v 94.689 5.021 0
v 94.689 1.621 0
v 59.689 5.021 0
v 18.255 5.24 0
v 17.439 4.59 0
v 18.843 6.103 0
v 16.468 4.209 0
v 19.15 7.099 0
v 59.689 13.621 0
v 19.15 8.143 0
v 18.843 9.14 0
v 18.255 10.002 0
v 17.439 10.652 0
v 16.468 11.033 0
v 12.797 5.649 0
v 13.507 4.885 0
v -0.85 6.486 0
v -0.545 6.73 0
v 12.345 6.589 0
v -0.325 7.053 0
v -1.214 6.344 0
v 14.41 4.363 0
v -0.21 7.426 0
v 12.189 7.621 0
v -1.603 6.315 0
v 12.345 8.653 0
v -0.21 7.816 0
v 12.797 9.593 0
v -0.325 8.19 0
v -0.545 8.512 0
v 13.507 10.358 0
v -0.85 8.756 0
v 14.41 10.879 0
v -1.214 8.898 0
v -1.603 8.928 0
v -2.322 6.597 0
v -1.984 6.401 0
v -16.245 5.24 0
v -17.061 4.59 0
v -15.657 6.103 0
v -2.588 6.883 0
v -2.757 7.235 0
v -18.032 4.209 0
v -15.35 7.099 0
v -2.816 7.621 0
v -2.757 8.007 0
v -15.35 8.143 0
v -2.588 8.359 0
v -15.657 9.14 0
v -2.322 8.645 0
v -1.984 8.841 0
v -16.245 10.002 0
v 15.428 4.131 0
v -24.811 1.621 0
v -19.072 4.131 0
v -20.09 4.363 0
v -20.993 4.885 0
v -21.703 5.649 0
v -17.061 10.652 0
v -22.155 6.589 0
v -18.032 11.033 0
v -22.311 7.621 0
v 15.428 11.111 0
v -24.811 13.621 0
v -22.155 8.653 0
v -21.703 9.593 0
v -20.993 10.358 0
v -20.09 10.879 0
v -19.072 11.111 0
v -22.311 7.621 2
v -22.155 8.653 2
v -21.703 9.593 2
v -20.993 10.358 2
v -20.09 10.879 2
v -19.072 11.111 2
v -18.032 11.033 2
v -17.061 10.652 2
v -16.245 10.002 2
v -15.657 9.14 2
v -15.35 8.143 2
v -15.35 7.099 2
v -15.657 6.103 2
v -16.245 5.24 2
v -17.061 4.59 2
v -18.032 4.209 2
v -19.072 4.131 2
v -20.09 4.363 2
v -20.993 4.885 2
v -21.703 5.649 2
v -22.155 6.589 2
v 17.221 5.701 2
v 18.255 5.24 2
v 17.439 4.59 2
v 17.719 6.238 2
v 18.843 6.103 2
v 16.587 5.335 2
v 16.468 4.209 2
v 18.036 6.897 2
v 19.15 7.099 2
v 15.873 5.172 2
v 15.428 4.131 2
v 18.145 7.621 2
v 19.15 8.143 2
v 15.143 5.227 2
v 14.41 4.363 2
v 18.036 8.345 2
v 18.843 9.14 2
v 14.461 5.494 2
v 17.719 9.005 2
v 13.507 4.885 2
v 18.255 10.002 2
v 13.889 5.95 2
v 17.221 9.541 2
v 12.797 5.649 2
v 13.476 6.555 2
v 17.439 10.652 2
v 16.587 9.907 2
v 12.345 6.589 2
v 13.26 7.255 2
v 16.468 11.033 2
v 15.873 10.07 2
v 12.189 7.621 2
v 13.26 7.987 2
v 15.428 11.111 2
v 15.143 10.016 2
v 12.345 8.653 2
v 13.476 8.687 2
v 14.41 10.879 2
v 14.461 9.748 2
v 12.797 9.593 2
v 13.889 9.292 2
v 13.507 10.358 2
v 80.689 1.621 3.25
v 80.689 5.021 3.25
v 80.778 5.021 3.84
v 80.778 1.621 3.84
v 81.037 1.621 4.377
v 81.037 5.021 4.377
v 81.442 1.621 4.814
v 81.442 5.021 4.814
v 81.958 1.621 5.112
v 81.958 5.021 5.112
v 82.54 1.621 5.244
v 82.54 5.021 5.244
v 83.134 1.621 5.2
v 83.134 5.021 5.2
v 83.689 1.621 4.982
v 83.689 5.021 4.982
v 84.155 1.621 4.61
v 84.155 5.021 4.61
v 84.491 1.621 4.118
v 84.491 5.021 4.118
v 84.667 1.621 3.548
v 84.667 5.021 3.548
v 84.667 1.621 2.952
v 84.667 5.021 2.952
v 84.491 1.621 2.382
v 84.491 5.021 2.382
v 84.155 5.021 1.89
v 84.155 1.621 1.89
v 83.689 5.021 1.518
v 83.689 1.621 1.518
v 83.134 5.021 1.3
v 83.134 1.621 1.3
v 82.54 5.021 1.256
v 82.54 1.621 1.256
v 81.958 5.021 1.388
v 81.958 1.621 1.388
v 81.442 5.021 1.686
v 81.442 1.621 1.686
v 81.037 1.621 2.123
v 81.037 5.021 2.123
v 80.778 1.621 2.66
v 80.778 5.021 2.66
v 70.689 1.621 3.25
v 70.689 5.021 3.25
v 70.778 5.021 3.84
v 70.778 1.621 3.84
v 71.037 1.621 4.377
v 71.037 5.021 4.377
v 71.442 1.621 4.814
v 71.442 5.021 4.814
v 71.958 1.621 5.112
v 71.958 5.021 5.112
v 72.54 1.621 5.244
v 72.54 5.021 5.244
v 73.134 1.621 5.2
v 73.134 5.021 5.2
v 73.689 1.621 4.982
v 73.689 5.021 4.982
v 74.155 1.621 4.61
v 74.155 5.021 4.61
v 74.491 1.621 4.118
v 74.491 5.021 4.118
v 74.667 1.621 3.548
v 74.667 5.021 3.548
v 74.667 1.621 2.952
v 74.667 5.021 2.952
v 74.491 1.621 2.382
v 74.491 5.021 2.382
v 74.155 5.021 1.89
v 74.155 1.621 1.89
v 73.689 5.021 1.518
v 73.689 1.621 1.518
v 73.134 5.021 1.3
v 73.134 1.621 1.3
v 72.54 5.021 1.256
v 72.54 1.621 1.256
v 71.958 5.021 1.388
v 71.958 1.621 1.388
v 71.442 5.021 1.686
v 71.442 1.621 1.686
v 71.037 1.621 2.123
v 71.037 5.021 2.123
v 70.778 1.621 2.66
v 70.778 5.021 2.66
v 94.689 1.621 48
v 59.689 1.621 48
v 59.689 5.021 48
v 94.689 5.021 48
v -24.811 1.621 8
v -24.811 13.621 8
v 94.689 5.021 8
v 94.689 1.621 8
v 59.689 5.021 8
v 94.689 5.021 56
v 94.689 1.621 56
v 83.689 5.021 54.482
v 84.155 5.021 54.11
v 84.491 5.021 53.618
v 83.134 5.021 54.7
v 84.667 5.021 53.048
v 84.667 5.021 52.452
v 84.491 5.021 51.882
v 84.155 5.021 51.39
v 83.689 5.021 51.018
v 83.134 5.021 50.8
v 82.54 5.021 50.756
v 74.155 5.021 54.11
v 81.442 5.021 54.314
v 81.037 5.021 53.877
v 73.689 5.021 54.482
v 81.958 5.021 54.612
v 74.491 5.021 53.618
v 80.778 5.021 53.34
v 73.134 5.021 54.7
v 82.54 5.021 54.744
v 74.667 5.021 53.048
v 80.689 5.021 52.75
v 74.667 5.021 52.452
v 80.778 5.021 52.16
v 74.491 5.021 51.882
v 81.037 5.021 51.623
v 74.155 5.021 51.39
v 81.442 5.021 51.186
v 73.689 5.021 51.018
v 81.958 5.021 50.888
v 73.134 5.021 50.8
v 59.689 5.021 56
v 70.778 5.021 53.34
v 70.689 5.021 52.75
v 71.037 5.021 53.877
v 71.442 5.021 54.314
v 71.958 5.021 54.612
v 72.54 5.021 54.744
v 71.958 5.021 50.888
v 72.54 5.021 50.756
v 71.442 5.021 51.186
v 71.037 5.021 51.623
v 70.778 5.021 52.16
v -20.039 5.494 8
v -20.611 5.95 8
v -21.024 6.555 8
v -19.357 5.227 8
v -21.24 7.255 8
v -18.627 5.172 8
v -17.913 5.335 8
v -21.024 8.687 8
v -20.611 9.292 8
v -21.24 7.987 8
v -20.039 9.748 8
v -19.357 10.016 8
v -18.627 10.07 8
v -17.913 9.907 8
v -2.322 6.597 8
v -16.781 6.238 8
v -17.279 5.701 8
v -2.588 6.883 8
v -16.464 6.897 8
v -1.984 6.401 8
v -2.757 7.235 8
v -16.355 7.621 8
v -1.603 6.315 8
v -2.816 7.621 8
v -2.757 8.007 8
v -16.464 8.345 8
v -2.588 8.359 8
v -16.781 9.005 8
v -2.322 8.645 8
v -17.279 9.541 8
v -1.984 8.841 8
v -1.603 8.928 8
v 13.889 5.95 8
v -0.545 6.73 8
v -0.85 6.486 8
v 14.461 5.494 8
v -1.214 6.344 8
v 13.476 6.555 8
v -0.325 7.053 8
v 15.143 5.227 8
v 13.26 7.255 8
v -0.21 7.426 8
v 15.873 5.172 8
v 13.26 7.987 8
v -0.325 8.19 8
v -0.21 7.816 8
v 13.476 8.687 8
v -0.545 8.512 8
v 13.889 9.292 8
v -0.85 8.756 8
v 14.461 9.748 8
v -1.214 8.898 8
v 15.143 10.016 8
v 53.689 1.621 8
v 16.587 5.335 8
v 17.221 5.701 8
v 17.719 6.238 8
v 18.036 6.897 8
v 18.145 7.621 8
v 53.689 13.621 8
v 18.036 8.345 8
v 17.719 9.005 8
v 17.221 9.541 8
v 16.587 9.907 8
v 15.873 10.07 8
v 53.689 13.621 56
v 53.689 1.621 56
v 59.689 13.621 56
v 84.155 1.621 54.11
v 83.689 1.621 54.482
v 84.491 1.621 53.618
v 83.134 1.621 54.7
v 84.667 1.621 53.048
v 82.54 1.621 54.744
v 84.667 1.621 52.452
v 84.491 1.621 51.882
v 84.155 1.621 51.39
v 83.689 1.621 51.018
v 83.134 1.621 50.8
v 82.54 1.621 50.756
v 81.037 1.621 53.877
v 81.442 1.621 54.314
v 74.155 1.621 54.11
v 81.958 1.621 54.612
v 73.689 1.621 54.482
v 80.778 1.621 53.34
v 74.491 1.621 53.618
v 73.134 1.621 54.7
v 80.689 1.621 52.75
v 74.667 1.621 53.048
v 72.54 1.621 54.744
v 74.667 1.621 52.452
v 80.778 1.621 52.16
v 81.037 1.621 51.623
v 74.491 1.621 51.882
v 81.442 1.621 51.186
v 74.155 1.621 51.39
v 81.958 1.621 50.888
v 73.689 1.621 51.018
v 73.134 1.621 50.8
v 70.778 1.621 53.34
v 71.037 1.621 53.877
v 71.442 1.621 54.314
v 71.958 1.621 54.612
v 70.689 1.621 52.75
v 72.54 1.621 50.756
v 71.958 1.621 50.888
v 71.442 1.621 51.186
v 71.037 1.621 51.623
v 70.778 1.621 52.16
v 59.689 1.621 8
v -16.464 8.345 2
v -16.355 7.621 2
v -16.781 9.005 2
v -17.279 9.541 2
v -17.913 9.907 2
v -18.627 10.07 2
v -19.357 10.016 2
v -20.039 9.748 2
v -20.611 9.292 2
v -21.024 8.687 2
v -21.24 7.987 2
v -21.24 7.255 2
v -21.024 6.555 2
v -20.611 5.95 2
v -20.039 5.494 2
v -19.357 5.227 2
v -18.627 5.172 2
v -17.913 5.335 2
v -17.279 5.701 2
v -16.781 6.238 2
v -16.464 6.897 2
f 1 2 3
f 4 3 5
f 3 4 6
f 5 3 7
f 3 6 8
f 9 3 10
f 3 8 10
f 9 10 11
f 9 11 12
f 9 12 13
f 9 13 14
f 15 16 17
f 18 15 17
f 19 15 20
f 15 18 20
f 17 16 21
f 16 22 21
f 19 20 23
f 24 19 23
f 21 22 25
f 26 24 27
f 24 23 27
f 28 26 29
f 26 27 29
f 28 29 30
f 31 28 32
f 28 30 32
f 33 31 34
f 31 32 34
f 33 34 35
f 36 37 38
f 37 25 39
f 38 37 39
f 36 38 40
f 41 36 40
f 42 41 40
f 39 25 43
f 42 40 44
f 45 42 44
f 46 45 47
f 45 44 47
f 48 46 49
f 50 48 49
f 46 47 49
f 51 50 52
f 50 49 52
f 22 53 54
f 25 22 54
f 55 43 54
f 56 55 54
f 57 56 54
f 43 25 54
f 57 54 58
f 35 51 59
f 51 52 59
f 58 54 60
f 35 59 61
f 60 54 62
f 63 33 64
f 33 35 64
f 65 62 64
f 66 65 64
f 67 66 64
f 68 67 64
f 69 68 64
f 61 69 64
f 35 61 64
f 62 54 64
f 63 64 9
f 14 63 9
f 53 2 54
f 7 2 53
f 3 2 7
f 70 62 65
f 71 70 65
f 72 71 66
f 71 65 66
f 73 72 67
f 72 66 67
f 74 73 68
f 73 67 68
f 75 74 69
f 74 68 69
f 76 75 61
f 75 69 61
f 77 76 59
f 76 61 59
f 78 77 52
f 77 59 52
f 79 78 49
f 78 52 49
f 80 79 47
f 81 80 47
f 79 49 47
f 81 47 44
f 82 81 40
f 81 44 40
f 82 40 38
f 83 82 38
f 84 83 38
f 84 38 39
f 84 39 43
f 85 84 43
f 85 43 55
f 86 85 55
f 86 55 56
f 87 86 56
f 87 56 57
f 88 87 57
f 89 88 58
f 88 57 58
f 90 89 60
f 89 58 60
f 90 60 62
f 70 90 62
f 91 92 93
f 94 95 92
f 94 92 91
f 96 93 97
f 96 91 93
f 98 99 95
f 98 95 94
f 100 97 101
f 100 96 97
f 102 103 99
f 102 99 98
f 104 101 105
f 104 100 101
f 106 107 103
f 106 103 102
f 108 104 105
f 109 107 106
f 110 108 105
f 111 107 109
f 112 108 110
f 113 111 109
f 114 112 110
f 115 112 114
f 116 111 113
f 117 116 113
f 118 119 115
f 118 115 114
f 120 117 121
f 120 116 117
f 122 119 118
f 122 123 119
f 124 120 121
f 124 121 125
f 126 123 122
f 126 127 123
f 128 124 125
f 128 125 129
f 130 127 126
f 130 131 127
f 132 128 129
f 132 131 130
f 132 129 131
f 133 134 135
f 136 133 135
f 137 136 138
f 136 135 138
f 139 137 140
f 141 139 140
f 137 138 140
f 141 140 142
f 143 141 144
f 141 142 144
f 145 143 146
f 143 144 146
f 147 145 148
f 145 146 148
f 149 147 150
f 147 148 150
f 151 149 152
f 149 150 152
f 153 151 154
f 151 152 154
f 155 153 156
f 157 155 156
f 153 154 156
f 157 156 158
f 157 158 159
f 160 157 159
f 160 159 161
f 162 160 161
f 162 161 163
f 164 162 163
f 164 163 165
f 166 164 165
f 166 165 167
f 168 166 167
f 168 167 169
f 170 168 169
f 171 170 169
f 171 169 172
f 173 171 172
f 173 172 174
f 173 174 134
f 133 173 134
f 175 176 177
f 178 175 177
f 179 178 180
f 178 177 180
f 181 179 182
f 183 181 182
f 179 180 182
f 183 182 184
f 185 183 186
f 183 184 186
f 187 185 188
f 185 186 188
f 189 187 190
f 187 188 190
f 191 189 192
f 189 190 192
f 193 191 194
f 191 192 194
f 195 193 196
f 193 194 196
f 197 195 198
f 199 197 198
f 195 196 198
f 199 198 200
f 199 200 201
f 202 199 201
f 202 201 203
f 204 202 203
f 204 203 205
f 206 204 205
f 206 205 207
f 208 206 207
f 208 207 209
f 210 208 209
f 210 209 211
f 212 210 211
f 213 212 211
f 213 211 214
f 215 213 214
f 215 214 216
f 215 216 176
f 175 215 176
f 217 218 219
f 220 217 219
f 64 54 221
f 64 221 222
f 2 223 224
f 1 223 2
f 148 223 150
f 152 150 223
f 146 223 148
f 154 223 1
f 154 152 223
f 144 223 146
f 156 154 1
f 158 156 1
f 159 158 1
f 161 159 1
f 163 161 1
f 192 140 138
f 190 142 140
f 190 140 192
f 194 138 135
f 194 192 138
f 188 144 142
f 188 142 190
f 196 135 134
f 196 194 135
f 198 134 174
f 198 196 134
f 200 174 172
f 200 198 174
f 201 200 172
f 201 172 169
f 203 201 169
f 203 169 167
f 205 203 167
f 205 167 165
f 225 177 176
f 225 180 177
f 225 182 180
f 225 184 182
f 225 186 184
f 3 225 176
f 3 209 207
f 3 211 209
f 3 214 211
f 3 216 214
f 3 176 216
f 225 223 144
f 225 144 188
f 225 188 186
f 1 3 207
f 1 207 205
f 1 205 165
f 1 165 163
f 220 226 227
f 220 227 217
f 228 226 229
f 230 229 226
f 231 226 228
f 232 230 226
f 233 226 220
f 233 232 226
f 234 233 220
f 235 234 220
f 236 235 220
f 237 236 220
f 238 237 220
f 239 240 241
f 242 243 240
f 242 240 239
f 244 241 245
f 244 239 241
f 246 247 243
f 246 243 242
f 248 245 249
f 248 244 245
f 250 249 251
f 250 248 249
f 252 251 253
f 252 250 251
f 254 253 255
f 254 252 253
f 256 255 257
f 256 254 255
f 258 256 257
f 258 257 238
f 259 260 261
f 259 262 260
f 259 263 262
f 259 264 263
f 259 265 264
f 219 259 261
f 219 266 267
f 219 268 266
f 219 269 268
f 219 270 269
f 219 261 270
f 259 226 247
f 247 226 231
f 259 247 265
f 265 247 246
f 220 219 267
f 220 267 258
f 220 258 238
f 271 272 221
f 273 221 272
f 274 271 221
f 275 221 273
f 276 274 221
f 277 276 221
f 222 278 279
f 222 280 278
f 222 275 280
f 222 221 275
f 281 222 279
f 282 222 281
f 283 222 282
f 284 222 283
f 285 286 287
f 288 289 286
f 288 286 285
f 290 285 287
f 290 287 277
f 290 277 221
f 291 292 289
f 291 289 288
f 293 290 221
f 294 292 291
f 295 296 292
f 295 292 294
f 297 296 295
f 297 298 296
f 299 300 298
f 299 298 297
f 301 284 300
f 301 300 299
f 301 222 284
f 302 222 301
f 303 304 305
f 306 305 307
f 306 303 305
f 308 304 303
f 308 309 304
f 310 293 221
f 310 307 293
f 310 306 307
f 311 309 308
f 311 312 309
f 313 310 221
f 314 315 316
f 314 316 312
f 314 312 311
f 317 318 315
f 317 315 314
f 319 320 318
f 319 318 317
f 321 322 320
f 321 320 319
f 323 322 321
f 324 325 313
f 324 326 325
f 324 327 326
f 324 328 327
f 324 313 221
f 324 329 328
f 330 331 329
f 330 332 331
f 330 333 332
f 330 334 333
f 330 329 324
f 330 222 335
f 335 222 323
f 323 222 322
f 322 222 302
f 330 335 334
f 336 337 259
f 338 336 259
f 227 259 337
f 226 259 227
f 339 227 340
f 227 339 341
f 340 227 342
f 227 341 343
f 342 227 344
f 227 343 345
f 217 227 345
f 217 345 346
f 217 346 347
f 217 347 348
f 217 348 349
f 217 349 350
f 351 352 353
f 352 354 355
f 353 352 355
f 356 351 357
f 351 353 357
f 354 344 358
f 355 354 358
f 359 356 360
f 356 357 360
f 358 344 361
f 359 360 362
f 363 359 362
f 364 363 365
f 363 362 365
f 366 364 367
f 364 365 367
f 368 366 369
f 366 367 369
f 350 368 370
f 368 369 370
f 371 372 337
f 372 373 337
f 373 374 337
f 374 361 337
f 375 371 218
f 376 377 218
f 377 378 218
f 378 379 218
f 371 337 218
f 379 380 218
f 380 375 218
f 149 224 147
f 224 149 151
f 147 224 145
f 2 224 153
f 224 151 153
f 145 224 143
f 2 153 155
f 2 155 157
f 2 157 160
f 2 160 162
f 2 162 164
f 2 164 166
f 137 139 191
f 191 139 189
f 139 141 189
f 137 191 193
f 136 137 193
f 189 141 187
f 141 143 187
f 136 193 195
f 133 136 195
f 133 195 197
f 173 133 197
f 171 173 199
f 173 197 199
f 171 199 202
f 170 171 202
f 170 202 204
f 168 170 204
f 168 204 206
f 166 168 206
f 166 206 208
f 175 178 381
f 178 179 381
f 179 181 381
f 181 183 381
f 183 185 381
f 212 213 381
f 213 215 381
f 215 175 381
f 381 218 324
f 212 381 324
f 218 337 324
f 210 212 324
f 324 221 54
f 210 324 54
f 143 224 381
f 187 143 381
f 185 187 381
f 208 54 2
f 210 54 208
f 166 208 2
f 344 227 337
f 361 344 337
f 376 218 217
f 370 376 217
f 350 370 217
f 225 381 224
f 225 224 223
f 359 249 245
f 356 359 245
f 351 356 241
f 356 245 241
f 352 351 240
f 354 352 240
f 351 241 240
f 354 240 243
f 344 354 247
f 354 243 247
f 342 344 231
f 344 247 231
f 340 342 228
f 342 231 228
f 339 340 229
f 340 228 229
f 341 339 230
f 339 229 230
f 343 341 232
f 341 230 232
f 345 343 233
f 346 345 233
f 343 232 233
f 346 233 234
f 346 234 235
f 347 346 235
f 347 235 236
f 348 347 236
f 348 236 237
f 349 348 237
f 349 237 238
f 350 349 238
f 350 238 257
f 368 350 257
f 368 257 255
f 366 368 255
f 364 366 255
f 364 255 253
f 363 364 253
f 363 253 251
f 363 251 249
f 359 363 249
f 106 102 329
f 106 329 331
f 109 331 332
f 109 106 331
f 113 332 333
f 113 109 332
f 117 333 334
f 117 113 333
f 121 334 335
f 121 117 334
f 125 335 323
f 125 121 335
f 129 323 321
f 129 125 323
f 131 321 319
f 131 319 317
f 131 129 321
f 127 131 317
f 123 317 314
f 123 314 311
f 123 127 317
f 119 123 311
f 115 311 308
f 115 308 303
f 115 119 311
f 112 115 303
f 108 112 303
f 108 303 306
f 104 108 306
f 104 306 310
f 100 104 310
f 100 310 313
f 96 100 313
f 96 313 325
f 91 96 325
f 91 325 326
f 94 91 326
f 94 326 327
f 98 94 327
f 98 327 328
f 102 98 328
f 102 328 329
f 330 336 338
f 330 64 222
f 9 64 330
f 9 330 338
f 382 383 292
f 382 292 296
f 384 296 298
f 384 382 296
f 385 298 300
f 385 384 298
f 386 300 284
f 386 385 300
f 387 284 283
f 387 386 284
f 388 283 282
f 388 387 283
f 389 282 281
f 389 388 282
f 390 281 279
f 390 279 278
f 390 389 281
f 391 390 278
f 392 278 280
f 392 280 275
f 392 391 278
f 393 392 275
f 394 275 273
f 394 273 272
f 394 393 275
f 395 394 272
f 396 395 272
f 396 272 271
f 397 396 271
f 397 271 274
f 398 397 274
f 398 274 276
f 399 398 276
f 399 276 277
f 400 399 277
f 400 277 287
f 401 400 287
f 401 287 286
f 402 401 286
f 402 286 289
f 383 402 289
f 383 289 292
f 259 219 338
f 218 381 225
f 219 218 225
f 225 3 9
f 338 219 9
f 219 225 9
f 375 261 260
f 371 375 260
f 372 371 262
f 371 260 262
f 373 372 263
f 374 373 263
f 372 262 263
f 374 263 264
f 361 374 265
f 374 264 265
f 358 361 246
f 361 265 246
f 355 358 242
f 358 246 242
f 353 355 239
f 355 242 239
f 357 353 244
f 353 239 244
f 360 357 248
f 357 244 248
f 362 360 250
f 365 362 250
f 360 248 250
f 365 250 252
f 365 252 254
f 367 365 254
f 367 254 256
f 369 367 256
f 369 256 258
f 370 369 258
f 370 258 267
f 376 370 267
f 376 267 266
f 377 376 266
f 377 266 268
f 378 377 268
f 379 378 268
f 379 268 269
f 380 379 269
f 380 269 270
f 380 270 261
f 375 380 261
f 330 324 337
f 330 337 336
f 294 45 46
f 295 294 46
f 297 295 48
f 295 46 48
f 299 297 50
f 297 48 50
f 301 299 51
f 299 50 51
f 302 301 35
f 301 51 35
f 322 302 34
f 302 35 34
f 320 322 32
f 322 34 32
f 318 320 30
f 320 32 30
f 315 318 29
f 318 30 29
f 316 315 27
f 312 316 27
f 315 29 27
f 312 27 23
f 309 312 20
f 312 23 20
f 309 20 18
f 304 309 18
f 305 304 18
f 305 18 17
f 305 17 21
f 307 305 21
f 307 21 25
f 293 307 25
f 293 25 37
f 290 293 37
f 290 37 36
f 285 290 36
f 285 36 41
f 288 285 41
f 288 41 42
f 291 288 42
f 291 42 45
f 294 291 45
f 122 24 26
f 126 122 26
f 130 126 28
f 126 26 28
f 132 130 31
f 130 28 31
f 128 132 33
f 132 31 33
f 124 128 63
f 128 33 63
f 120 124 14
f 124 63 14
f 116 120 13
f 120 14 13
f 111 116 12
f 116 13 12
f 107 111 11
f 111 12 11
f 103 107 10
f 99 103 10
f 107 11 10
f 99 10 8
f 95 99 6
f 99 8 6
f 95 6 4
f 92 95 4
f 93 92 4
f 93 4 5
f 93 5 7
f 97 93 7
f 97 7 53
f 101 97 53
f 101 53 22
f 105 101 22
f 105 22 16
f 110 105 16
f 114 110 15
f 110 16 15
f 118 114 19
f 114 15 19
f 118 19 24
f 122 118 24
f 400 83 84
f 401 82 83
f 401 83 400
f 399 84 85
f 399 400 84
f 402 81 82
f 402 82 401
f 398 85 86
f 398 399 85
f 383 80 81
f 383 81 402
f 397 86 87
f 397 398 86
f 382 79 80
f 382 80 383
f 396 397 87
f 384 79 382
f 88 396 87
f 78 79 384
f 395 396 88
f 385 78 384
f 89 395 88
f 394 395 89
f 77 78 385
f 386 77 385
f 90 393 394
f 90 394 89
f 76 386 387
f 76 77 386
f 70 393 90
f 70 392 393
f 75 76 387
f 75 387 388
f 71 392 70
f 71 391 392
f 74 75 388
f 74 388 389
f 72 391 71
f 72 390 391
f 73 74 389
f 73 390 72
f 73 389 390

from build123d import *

# Parameters (mm, degrees)
SKETCH8_W           = 84.5
SKETCH8_H           = 12
SKETCH8_R           = 2.456134815
BOSS_EXTRUDE4_DEPTH = 8
SKETCH9_R           = 3.5
CUT_EXTRUDE3_DEPTH  = 2
SKETCH10_W          = 6
SKETCH10_H          = 12
BOSS_EXTRUDE5_DEPTH = 48
SKETCH11_W          = 8
SKETCH11_H          = 3.4
BOSS_EXTRUDE6_DEPTH = 35
SKETCH12_R          = 2
CUT_EXTRUDE4_DEPTH  = 35
SKETCH13_R          = 1.310160124
CUT_EXTRUDE5_DEPTH  = 10


with BuildPart() as part:
    # Sketch8 → Boss-Extrude4 (new body)
    with BuildSketch(Plane.XY):
        with Locations((17.439173688, 7.621093459)):
            Rectangle(SKETCH8_W, SKETCH8_H)
        with Locations((-18.810826312, 7.621093459)):
            Circle(SKETCH8_R, mode=Mode.SUBTRACT)
        with Locations((15.689173688, 7.621093459)):
            Circle(SKETCH8_R, mode=Mode.SUBTRACT)
    extrude(amount=BOSS_EXTRUDE4_DEPTH)

    # Sketch9 → Cut-Extrude3 (cut)
    with BuildSketch(Plane(origin=(0, 0, 0), x_dir=(-1, 0, 0), z_dir=(0, 0, -1))):
        with Locations((-15.689173688, 7.621093459)):
            Circle(SKETCH9_R)
        with Locations((18.810826312, 7.621093459)):
            Circle(SKETCH9_R)
    extrude(amount=-CUT_EXTRUDE3_DEPTH, mode=Mode.SUBTRACT)

    # Sketch10 → Boss-Extrude5 (add)
    with BuildSketch(Plane.XY.offset(8)):
        with Locations((56.689173688, 7.621093459)):
            Rectangle(SKETCH10_W, SKETCH10_H)
    extrude(amount=BOSS_EXTRUDE5_DEPTH)

    # Sketch11 → Boss-Extrude6 (add)
    with BuildSketch(Plane(origin=(59.689173688, 0, 0), x_dir=(0, 0, -1), z_dir=(1, 0, 0))):
        with Locations((-4, 3.321093459)):
            Rectangle(SKETCH11_W, SKETCH11_H)
        with Locations((-52, 3.321093459)):
            Rectangle(SKETCH11_W, SKETCH11_H)
    extrude(amount=BOSS_EXTRUDE6_DEPTH)

    # Sketch12 → Cut-Extrude4 (cut)
    with BuildSketch(Plane(origin=(0, 5.021093459, 0), x_dir=(1, 0, 0), z_dir=(0, 1, 0))):
        with Locations((72.689173688, -3.25)):
            Circle(SKETCH12_R)
        with Locations((82.689173688, -3.25)):
            Circle(SKETCH12_R)
        with Locations((72.689173688, -52.75)):
            Circle(SKETCH12_R)
        with Locations((82.689173688, -52.75)):
            Circle(SKETCH12_R)
    extrude(amount=-CUT_EXTRUDE4_DEPTH, mode=Mode.SUBTRACT)

    # Sketch13 → Cut-Extrude5 (cut)
    with BuildSketch(Plane(origin=(0, 0, 0), x_dir=(-1, 0, 0), z_dir=(0, 0, -1))):
        with Locations((1.505343306, 7.621093459)):
            Circle(SKETCH13_R)
    extrude(amount=-CUT_EXTRUDE5_DEPTH, mode=Mode.SUBTRACT)


solid = part.part
